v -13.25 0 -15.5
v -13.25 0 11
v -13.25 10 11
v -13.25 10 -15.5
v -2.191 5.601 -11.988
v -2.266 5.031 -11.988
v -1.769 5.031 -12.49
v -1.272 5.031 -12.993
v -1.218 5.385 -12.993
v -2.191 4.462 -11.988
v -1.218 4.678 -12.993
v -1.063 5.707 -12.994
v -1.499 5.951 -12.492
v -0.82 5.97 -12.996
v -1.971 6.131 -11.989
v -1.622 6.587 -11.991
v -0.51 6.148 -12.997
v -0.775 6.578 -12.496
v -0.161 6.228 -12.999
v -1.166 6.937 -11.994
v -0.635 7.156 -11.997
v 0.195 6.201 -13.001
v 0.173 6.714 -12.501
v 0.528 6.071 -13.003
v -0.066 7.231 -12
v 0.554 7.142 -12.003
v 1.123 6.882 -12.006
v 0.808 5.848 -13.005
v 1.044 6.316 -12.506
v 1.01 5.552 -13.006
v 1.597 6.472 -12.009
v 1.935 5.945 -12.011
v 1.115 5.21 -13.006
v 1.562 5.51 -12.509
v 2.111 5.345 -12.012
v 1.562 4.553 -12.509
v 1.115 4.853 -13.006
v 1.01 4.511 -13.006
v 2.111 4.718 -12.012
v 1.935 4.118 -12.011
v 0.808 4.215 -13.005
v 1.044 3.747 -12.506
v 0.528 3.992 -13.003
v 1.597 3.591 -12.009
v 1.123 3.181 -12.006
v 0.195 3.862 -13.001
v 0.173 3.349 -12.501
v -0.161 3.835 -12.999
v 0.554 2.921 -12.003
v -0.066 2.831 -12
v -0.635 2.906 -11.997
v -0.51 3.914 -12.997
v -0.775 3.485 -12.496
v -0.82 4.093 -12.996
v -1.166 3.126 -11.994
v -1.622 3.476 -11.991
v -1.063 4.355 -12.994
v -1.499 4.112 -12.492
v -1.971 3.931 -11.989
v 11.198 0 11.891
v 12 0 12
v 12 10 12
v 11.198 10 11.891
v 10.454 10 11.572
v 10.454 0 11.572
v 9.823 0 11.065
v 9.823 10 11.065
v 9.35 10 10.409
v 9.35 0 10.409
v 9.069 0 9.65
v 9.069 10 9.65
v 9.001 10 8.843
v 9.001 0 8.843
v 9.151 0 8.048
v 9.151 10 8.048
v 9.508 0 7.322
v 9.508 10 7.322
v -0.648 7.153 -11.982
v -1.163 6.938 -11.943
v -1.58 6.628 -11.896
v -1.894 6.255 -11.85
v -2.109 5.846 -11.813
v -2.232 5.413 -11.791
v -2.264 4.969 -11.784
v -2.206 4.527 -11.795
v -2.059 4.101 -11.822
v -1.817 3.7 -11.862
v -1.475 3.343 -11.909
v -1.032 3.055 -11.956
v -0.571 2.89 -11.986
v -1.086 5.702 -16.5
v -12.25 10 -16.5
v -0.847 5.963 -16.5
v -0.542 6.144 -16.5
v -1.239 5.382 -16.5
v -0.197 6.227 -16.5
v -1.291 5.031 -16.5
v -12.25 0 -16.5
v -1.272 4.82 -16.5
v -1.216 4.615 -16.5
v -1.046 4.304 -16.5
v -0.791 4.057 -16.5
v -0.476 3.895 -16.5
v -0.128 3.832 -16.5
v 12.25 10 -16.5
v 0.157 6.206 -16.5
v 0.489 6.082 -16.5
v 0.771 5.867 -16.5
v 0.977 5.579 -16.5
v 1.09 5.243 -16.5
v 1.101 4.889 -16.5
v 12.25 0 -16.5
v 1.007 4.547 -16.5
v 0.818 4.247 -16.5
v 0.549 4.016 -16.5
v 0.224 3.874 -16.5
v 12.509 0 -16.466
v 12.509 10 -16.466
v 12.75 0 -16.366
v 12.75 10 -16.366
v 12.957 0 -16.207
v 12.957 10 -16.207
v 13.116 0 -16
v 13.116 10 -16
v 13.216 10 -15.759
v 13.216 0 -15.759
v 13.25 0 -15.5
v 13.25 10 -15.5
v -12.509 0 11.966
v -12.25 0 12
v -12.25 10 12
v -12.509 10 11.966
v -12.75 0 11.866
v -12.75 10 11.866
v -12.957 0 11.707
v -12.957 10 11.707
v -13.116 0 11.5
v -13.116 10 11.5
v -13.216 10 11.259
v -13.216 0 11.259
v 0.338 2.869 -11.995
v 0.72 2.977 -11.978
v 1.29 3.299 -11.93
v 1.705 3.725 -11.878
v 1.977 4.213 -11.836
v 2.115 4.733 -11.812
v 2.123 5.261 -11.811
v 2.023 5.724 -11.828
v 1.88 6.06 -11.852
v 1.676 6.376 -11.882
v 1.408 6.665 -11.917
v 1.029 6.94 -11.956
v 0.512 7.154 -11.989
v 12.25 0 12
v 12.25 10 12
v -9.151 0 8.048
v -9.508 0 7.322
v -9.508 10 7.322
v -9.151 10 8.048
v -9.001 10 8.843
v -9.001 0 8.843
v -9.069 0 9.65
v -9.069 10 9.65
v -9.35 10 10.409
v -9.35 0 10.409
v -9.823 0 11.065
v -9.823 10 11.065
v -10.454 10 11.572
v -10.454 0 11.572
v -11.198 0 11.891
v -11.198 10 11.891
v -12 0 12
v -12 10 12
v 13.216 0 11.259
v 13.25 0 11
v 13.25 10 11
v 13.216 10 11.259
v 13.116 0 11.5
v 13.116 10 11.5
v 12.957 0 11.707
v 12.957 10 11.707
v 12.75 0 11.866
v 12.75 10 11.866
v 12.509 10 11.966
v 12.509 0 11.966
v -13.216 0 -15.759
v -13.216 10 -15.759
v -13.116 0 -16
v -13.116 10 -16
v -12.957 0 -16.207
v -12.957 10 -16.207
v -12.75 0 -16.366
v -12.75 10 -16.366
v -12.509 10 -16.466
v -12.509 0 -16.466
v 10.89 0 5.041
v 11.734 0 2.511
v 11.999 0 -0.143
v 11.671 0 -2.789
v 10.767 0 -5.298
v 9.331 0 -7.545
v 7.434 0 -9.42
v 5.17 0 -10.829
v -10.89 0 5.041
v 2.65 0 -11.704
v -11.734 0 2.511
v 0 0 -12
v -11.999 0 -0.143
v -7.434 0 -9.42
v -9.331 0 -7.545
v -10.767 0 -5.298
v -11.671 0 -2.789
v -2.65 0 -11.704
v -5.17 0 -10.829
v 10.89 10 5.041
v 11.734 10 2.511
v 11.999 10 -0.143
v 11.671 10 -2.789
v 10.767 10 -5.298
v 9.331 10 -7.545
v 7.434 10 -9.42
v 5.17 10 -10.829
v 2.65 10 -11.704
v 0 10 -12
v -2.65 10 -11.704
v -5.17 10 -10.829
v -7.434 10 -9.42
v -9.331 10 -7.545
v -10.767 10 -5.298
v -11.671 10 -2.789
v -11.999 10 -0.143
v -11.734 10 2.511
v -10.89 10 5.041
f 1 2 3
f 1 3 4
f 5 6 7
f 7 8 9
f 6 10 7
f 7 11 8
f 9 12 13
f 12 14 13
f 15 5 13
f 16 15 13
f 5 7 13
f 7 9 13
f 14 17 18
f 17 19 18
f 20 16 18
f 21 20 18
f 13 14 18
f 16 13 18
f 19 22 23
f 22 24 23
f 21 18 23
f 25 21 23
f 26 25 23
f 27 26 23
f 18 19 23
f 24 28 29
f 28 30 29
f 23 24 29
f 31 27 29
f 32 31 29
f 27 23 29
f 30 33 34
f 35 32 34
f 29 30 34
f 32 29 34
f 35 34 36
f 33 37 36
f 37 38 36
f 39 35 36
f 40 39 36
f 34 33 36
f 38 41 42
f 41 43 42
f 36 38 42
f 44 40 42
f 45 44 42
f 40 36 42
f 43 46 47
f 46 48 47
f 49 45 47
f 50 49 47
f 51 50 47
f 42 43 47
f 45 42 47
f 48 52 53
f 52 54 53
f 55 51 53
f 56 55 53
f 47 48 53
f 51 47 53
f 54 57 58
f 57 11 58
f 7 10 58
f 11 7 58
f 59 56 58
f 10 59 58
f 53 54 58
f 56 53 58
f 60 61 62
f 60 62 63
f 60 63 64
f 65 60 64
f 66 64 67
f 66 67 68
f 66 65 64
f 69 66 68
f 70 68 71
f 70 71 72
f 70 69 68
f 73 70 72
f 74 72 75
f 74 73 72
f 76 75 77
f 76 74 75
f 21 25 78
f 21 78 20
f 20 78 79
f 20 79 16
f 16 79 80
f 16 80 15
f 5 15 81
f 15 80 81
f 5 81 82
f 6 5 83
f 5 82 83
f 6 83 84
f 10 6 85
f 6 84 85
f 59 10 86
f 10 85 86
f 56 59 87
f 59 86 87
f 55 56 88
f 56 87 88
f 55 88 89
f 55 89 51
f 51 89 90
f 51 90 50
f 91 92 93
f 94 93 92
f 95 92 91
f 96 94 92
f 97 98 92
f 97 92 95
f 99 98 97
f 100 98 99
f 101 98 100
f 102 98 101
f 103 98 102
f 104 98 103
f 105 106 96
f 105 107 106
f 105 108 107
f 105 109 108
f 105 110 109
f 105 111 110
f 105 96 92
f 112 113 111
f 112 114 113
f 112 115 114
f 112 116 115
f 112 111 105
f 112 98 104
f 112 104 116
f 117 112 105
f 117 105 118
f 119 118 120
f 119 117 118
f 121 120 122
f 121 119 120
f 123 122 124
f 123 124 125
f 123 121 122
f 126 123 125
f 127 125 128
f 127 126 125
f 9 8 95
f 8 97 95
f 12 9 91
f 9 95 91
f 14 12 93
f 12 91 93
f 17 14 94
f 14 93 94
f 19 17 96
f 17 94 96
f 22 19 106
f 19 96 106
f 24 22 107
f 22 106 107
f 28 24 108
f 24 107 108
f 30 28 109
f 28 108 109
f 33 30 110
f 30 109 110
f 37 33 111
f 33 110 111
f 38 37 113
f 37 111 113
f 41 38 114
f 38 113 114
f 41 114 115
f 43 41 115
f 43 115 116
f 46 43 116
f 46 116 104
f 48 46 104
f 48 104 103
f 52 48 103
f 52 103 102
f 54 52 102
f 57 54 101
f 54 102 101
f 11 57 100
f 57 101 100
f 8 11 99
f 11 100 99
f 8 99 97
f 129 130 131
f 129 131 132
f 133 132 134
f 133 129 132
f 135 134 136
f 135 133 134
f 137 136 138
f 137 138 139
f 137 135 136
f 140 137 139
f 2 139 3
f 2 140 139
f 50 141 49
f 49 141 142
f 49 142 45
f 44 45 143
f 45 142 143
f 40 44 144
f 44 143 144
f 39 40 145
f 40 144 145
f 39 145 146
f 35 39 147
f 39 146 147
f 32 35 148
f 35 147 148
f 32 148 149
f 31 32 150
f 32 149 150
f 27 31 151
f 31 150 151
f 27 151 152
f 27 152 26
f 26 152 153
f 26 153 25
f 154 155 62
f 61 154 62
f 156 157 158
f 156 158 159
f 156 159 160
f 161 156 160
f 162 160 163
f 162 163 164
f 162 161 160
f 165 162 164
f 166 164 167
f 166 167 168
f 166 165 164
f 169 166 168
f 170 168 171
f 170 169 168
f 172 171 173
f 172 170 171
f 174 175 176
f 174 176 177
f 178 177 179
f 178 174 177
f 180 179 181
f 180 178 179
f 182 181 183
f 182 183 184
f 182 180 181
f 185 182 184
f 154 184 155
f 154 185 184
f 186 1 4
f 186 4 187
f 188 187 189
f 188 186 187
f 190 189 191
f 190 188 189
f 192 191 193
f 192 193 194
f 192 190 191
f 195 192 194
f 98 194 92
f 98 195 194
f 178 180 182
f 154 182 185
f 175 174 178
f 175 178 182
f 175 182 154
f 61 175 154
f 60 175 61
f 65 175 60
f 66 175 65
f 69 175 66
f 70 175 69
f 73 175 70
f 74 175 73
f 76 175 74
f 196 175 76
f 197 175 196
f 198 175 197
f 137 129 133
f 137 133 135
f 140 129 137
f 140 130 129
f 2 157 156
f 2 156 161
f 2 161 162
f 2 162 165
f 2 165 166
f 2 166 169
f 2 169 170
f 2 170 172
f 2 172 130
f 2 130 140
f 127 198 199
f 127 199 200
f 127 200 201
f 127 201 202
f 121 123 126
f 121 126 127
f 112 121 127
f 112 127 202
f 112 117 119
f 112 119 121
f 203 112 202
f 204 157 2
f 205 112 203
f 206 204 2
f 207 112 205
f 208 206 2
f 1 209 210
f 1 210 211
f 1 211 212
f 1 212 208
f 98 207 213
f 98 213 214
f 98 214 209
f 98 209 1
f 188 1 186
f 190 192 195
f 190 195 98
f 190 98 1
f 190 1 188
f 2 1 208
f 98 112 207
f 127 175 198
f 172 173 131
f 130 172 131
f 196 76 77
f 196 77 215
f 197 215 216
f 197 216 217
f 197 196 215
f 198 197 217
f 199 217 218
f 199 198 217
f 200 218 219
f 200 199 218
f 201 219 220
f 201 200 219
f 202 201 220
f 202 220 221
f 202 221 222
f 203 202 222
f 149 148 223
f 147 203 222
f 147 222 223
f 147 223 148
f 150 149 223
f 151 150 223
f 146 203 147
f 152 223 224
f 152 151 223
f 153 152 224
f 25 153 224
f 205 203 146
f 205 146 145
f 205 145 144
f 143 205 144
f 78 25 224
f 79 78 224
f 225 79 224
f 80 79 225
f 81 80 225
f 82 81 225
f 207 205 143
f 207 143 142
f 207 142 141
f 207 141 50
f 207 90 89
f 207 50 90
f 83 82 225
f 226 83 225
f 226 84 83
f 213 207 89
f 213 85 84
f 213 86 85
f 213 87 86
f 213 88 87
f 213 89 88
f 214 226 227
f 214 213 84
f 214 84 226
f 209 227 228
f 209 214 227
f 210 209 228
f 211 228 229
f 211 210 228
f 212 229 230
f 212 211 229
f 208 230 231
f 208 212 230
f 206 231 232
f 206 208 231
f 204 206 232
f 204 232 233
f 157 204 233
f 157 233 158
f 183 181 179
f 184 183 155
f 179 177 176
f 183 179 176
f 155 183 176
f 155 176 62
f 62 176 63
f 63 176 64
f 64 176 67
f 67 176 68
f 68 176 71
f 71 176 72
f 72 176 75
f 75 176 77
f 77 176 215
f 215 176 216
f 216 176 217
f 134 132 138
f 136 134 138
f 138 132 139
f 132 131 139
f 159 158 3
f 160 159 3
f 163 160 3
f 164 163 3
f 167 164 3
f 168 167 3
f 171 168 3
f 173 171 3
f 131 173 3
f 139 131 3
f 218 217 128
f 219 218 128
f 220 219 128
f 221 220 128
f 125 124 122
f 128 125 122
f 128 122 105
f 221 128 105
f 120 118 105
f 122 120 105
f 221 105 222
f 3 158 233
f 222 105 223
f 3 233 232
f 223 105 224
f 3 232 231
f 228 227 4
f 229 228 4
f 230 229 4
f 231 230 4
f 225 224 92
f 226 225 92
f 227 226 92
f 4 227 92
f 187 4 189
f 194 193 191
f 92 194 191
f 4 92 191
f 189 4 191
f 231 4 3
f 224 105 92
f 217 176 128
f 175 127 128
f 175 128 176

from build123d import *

# Parameters (mm, degrees)
BOSS_EXTRUDE1_DEPTH                             = 10
CSK_FOR_M2_FLAT_HEAD_MACHINE_SCREW1_D           = 2.4
CSK_FOR_M2_FLAT_HEAD_MACHINE_SCREW1_CSINK_D     = 4.4
CSK_FOR_M2_FLAT_HEAD_MACHINE_SCREW1_CSINK_ANGLE = 90


with BuildPart() as part:
    # Sketch1 → Boss-Extrude1 (new body)
    with BuildSketch(Plane(origin=(0, 0, 0), x_dir=(1, 0, 0), z_dir=(0, 1, 0))):
        with BuildLine():
            Line((12.25, -12), (12, -12))
            ThreePointArc((12, -12), (9.349555065, -10.408922304), (9.507567542, -7.321622732))
            ThreePointArc((9.507567542, -7.321622732), (0, 12), (-9.507567542, -7.321622732))
            ThreePointArc((-9.507567542, -7.321622732), (-9.349555065, -10.408922304), (-12, -12))
            Line((-12, -12), (-12.25, -12))
            ThreePointArc((-12.25, -12), (-12.957106781, -11.707106781), (-13.25, -11))
            Line((-13.25, -11), (-13.25, 15.5))
            ThreePointArc((-13.25, 15.5), (-12.957106781, 16.207106781), (-12.25, 16.5))
            Line((-12.25, 16.5), (12.25, 16.5))
            ThreePointArc((12.25, 16.5), (12.957106781, 16.207106781), (13.25, 15.5))
            Line((13.25, 15.5), (13.25, -11))
            ThreePointArc((13.25, -11), (12.957106781, -11.707106781), (12.25, -12))
        make_face()
    extrude(amount=BOSS_EXTRUDE1_DEPTH)

    # CSK for M2 Flat Head Machine Screw1 (through all)
    with Locations(Plane(origin=(-0.06607942, 5.031445439, -11.999818062), x_dir=(0.999984838462, 0, -0.005506618355), z_dir=(0.005506618355, 0, 0.999984838462))):
        with Locations((0, 0)):
            CounterSinkHole(CSK_FOR_M2_FLAT_HEAD_MACHINE_SCREW1_D / 2, CSK_FOR_M2_FLAT_HEAD_MACHINE_SCREW1_CSINK_D / 2, counter_sink_angle=CSK_FOR_M2_FLAT_HEAD_MACHINE_SCREW1_CSINK_ANGLE)


solid = part.part
